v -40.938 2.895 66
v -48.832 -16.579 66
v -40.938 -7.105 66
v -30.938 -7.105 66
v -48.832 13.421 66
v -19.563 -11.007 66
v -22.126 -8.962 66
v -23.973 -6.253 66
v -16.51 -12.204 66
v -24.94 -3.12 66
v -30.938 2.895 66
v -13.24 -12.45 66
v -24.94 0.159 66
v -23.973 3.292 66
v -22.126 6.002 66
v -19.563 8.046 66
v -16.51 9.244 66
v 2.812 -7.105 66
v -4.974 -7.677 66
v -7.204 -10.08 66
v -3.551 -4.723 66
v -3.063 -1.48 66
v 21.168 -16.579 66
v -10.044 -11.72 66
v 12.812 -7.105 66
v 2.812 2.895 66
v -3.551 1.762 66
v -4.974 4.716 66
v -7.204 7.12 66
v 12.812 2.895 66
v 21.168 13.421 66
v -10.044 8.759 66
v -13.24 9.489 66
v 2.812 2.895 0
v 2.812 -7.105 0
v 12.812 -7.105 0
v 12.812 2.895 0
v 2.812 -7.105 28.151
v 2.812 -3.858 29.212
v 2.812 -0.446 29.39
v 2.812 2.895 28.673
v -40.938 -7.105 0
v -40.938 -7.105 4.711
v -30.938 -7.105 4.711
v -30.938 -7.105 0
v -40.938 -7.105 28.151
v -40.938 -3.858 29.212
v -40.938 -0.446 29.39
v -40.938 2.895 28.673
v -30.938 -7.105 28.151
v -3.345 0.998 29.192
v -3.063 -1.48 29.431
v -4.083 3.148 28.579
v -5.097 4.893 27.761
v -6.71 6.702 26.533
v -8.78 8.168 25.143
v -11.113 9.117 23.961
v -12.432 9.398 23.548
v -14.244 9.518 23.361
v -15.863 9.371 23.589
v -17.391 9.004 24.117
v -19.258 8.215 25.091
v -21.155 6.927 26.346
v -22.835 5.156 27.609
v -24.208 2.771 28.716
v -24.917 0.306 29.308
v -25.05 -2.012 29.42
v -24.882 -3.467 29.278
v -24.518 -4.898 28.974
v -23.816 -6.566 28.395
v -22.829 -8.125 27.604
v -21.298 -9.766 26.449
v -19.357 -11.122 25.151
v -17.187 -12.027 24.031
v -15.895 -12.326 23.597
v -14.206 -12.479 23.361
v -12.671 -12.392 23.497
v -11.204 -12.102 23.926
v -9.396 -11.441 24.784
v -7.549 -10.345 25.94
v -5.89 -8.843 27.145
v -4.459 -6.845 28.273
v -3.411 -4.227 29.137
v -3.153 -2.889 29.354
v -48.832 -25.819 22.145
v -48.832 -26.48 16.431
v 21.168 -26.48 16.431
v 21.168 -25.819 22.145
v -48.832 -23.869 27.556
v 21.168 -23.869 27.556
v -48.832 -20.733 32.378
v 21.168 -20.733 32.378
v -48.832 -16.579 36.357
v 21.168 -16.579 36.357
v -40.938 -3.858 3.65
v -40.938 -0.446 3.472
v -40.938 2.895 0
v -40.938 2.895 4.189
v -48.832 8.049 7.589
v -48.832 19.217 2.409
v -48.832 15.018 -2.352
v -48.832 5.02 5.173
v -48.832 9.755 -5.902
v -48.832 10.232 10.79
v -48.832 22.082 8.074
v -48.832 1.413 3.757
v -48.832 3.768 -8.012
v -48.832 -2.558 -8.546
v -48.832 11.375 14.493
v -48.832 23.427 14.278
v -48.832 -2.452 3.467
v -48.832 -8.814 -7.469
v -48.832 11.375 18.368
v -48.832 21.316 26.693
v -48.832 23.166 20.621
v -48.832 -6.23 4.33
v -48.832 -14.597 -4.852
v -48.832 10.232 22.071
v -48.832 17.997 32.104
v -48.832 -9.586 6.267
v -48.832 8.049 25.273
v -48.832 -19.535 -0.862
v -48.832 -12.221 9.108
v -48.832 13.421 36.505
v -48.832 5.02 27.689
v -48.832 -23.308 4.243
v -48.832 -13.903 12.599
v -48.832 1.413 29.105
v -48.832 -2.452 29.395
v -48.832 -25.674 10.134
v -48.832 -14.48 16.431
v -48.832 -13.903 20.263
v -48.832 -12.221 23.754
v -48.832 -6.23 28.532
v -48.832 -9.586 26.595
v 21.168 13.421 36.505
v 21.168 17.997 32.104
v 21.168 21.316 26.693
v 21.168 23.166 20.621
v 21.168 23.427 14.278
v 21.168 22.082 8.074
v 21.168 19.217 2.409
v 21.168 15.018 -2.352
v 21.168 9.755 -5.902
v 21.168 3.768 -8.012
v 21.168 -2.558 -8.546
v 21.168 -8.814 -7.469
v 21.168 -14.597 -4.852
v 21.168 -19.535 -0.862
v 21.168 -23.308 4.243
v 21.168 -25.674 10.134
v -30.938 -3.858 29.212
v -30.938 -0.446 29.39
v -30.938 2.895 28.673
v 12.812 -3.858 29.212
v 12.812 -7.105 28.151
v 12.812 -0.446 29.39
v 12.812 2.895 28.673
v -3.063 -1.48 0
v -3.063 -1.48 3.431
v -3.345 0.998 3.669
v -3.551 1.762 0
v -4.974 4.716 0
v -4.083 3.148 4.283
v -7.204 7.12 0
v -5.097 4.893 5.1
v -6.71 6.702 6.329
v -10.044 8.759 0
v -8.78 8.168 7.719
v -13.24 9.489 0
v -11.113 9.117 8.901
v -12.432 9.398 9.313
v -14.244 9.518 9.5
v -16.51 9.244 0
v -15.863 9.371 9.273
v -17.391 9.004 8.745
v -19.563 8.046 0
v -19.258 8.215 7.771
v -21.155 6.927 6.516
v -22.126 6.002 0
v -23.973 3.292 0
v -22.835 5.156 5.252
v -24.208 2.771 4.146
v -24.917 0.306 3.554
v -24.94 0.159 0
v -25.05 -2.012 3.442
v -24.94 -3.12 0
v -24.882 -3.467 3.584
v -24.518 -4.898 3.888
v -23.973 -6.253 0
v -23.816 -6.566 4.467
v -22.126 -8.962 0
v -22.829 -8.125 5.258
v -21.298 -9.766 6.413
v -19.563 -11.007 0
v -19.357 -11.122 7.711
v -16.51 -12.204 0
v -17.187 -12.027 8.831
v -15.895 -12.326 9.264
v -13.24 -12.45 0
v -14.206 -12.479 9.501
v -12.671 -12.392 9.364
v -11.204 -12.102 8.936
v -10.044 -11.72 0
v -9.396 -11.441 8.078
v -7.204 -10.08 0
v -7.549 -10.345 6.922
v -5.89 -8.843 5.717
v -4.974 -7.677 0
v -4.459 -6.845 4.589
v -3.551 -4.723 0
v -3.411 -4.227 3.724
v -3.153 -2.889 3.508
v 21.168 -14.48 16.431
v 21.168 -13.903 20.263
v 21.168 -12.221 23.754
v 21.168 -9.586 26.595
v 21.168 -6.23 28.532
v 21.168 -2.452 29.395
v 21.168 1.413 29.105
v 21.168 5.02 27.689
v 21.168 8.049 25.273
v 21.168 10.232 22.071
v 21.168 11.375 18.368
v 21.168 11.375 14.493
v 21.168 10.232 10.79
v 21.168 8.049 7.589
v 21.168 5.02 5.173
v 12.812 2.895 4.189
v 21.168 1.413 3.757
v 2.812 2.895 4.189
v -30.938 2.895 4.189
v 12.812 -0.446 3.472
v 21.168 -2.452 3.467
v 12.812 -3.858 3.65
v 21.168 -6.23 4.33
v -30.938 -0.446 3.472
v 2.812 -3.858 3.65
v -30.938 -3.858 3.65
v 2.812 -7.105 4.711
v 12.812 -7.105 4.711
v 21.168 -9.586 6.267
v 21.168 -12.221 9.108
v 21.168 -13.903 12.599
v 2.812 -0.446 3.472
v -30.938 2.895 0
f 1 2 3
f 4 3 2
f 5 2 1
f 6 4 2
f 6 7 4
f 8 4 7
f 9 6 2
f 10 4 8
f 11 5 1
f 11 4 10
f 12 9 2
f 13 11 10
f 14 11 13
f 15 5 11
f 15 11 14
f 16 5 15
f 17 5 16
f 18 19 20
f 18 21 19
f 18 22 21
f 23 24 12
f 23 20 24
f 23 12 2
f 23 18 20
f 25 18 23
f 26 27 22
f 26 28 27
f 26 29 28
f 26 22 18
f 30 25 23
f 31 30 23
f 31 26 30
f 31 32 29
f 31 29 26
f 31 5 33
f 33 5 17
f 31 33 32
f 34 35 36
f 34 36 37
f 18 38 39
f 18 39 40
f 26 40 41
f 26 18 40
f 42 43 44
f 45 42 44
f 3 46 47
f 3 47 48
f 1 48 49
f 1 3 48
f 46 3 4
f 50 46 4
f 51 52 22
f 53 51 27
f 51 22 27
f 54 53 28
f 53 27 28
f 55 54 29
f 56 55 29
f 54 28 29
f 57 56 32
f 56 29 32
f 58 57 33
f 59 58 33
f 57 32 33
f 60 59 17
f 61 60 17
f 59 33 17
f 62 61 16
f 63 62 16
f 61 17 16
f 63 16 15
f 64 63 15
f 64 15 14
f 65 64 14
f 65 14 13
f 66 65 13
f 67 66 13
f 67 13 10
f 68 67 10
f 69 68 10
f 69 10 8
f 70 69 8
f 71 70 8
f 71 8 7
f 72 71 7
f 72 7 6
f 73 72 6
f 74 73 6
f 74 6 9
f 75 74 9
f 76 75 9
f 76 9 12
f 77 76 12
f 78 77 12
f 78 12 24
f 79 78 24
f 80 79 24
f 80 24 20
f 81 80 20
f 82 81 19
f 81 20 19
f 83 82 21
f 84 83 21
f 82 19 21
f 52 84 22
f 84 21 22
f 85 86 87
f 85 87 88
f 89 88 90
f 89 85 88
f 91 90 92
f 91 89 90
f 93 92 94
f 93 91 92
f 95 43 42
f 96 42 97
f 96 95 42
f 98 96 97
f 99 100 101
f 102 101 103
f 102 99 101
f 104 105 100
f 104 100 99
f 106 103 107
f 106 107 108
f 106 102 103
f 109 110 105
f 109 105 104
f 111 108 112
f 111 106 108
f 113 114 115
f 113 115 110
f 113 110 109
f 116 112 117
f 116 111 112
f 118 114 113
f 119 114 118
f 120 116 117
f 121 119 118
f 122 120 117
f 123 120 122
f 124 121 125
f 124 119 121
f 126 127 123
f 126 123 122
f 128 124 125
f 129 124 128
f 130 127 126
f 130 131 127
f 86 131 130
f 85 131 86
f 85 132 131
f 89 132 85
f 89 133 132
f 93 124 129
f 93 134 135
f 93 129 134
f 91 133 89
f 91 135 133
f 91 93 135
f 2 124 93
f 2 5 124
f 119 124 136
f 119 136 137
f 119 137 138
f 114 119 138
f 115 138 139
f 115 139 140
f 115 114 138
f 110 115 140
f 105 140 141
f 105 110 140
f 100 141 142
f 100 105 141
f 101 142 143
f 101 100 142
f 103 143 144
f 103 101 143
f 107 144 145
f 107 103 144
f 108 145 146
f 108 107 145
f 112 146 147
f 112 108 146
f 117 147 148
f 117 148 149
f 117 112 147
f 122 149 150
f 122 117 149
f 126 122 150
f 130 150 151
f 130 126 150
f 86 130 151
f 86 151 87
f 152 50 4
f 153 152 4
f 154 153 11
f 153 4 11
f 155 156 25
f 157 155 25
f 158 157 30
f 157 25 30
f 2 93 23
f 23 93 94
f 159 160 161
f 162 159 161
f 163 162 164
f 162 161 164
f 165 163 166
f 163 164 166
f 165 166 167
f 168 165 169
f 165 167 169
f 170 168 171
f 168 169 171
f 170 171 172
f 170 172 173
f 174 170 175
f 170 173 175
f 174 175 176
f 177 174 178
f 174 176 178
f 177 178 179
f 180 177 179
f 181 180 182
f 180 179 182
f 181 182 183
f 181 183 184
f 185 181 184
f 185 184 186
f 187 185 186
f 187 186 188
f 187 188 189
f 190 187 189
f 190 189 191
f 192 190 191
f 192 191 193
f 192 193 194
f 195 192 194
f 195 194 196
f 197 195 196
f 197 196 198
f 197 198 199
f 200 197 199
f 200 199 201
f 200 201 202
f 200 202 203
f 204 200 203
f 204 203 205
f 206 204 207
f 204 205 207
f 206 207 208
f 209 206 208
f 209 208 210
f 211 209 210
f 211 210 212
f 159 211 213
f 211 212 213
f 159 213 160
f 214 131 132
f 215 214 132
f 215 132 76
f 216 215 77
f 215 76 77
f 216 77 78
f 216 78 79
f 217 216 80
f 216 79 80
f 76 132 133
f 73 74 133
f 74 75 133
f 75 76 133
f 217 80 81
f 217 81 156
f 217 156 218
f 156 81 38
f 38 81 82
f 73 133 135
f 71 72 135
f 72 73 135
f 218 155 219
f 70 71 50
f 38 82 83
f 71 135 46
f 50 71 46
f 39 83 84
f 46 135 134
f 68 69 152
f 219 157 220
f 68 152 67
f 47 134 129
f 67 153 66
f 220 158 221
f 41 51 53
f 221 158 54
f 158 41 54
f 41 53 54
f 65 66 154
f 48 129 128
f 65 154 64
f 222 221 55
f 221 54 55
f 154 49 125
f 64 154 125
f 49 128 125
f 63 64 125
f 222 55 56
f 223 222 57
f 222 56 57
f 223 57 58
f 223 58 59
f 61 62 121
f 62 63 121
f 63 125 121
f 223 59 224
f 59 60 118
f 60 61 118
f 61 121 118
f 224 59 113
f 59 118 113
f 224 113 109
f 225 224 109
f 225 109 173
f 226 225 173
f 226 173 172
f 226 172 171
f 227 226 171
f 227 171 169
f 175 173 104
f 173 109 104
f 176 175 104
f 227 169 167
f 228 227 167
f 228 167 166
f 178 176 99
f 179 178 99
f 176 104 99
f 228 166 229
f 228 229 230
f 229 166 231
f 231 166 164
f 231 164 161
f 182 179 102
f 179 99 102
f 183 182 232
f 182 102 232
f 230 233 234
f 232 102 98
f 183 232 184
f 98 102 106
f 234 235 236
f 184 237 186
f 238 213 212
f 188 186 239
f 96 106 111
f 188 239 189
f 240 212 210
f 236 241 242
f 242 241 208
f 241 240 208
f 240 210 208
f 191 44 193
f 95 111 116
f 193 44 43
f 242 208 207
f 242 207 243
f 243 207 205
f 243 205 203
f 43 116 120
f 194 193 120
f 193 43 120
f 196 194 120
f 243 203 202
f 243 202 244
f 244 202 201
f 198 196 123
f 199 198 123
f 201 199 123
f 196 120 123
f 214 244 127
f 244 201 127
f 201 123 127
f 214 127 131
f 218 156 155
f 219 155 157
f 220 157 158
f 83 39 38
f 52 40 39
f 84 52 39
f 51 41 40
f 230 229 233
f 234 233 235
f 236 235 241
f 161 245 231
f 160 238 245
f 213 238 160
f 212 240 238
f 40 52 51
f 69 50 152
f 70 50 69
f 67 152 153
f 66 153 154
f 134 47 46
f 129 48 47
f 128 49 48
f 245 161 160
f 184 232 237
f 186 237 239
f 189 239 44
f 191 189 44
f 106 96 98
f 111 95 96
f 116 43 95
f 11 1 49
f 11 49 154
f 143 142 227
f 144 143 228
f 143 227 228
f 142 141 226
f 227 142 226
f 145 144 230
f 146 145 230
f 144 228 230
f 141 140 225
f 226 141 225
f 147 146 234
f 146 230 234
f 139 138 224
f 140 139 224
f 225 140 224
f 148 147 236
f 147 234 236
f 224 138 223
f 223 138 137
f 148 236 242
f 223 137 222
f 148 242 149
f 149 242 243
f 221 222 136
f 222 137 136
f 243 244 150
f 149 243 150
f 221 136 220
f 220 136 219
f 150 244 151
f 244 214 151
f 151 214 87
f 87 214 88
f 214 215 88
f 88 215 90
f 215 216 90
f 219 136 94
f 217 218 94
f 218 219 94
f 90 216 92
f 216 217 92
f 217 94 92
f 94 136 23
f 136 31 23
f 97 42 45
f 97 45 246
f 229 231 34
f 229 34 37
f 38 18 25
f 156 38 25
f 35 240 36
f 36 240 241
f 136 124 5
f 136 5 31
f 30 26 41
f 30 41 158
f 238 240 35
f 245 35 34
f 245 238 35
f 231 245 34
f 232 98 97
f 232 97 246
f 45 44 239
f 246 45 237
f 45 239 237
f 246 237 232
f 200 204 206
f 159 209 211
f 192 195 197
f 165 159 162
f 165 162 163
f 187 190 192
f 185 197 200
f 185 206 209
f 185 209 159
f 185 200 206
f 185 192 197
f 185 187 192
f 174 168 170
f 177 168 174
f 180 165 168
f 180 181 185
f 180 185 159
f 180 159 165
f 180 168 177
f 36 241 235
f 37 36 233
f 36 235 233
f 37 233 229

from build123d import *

# Parameters (mm, degrees)
F0_W     = 70
F0_H     = 30
F1_DEPTH = 66
F2_W     = 10
F2_H     = 10
F2_R     = 11
F3_DEPTH = 66
F5_DEPTH = 70
F6_R     = 13
F7_DEPTH = 70


with BuildPart() as f1:
    # F0 (on Top) → F1 (new body)
    with BuildSketch(Plane.XY):
        with Locations((-13.832236, -1.578948)):
            Rectangle(F0_W, F0_H)
    extrude(amount=F1_DEPTH)

    # F2 (on face) → F3 (cut)
    with BuildSketch(Plane.XY.offset(66)):
        with Locations((-35.937502, -2.105263)):
            Rectangle(F2_W, F2_H)
        with Locations((7.812499, -2.105263)):
            Rectangle(F2_W, F2_H)
        with Locations((-14.062501, -1.480263)):
            Circle(F2_R)
    extrude(amount=-F3_DEPTH, mode=Mode.SUBTRACT)

    # F4 (on face) → F5 (join)
    with BuildSketch(Plane(origin=(-48.832236, 0, 0), x_dir=(0, -1, 0), z_dir=(-1, 0, 0))):
        with BuildLine():
            ThreePointArc((-13.421052, 36.504558), (-9.755108, -5.902156), (26.480263, 16.430924))
            ThreePointArc((26.480263, 16.430924), (23.868509, 27.55596), (16.578948, 36.356528))
            Line((16.578948, 36.356528), (16.578948, 0))
            Line((16.578948, 0), (-13.421052, 0))
            Line((-13.421052, 0), (-13.421052, 36.504558))
        make_face()
    extrude(amount=-F5_DEPTH)

    # F6 (on face) → F7 (cut)
    with BuildSketch(Plane(origin=(-48.832236, 0, 0), x_dir=(0, -1, 0), z_dir=(-1, 0, 0))):
        with Locations((1.480263, 16.430924)):
            Circle(F6_R)
    extrude(amount=-F7_DEPTH, mode=Mode.SUBTRACT)


solid = f1.part
